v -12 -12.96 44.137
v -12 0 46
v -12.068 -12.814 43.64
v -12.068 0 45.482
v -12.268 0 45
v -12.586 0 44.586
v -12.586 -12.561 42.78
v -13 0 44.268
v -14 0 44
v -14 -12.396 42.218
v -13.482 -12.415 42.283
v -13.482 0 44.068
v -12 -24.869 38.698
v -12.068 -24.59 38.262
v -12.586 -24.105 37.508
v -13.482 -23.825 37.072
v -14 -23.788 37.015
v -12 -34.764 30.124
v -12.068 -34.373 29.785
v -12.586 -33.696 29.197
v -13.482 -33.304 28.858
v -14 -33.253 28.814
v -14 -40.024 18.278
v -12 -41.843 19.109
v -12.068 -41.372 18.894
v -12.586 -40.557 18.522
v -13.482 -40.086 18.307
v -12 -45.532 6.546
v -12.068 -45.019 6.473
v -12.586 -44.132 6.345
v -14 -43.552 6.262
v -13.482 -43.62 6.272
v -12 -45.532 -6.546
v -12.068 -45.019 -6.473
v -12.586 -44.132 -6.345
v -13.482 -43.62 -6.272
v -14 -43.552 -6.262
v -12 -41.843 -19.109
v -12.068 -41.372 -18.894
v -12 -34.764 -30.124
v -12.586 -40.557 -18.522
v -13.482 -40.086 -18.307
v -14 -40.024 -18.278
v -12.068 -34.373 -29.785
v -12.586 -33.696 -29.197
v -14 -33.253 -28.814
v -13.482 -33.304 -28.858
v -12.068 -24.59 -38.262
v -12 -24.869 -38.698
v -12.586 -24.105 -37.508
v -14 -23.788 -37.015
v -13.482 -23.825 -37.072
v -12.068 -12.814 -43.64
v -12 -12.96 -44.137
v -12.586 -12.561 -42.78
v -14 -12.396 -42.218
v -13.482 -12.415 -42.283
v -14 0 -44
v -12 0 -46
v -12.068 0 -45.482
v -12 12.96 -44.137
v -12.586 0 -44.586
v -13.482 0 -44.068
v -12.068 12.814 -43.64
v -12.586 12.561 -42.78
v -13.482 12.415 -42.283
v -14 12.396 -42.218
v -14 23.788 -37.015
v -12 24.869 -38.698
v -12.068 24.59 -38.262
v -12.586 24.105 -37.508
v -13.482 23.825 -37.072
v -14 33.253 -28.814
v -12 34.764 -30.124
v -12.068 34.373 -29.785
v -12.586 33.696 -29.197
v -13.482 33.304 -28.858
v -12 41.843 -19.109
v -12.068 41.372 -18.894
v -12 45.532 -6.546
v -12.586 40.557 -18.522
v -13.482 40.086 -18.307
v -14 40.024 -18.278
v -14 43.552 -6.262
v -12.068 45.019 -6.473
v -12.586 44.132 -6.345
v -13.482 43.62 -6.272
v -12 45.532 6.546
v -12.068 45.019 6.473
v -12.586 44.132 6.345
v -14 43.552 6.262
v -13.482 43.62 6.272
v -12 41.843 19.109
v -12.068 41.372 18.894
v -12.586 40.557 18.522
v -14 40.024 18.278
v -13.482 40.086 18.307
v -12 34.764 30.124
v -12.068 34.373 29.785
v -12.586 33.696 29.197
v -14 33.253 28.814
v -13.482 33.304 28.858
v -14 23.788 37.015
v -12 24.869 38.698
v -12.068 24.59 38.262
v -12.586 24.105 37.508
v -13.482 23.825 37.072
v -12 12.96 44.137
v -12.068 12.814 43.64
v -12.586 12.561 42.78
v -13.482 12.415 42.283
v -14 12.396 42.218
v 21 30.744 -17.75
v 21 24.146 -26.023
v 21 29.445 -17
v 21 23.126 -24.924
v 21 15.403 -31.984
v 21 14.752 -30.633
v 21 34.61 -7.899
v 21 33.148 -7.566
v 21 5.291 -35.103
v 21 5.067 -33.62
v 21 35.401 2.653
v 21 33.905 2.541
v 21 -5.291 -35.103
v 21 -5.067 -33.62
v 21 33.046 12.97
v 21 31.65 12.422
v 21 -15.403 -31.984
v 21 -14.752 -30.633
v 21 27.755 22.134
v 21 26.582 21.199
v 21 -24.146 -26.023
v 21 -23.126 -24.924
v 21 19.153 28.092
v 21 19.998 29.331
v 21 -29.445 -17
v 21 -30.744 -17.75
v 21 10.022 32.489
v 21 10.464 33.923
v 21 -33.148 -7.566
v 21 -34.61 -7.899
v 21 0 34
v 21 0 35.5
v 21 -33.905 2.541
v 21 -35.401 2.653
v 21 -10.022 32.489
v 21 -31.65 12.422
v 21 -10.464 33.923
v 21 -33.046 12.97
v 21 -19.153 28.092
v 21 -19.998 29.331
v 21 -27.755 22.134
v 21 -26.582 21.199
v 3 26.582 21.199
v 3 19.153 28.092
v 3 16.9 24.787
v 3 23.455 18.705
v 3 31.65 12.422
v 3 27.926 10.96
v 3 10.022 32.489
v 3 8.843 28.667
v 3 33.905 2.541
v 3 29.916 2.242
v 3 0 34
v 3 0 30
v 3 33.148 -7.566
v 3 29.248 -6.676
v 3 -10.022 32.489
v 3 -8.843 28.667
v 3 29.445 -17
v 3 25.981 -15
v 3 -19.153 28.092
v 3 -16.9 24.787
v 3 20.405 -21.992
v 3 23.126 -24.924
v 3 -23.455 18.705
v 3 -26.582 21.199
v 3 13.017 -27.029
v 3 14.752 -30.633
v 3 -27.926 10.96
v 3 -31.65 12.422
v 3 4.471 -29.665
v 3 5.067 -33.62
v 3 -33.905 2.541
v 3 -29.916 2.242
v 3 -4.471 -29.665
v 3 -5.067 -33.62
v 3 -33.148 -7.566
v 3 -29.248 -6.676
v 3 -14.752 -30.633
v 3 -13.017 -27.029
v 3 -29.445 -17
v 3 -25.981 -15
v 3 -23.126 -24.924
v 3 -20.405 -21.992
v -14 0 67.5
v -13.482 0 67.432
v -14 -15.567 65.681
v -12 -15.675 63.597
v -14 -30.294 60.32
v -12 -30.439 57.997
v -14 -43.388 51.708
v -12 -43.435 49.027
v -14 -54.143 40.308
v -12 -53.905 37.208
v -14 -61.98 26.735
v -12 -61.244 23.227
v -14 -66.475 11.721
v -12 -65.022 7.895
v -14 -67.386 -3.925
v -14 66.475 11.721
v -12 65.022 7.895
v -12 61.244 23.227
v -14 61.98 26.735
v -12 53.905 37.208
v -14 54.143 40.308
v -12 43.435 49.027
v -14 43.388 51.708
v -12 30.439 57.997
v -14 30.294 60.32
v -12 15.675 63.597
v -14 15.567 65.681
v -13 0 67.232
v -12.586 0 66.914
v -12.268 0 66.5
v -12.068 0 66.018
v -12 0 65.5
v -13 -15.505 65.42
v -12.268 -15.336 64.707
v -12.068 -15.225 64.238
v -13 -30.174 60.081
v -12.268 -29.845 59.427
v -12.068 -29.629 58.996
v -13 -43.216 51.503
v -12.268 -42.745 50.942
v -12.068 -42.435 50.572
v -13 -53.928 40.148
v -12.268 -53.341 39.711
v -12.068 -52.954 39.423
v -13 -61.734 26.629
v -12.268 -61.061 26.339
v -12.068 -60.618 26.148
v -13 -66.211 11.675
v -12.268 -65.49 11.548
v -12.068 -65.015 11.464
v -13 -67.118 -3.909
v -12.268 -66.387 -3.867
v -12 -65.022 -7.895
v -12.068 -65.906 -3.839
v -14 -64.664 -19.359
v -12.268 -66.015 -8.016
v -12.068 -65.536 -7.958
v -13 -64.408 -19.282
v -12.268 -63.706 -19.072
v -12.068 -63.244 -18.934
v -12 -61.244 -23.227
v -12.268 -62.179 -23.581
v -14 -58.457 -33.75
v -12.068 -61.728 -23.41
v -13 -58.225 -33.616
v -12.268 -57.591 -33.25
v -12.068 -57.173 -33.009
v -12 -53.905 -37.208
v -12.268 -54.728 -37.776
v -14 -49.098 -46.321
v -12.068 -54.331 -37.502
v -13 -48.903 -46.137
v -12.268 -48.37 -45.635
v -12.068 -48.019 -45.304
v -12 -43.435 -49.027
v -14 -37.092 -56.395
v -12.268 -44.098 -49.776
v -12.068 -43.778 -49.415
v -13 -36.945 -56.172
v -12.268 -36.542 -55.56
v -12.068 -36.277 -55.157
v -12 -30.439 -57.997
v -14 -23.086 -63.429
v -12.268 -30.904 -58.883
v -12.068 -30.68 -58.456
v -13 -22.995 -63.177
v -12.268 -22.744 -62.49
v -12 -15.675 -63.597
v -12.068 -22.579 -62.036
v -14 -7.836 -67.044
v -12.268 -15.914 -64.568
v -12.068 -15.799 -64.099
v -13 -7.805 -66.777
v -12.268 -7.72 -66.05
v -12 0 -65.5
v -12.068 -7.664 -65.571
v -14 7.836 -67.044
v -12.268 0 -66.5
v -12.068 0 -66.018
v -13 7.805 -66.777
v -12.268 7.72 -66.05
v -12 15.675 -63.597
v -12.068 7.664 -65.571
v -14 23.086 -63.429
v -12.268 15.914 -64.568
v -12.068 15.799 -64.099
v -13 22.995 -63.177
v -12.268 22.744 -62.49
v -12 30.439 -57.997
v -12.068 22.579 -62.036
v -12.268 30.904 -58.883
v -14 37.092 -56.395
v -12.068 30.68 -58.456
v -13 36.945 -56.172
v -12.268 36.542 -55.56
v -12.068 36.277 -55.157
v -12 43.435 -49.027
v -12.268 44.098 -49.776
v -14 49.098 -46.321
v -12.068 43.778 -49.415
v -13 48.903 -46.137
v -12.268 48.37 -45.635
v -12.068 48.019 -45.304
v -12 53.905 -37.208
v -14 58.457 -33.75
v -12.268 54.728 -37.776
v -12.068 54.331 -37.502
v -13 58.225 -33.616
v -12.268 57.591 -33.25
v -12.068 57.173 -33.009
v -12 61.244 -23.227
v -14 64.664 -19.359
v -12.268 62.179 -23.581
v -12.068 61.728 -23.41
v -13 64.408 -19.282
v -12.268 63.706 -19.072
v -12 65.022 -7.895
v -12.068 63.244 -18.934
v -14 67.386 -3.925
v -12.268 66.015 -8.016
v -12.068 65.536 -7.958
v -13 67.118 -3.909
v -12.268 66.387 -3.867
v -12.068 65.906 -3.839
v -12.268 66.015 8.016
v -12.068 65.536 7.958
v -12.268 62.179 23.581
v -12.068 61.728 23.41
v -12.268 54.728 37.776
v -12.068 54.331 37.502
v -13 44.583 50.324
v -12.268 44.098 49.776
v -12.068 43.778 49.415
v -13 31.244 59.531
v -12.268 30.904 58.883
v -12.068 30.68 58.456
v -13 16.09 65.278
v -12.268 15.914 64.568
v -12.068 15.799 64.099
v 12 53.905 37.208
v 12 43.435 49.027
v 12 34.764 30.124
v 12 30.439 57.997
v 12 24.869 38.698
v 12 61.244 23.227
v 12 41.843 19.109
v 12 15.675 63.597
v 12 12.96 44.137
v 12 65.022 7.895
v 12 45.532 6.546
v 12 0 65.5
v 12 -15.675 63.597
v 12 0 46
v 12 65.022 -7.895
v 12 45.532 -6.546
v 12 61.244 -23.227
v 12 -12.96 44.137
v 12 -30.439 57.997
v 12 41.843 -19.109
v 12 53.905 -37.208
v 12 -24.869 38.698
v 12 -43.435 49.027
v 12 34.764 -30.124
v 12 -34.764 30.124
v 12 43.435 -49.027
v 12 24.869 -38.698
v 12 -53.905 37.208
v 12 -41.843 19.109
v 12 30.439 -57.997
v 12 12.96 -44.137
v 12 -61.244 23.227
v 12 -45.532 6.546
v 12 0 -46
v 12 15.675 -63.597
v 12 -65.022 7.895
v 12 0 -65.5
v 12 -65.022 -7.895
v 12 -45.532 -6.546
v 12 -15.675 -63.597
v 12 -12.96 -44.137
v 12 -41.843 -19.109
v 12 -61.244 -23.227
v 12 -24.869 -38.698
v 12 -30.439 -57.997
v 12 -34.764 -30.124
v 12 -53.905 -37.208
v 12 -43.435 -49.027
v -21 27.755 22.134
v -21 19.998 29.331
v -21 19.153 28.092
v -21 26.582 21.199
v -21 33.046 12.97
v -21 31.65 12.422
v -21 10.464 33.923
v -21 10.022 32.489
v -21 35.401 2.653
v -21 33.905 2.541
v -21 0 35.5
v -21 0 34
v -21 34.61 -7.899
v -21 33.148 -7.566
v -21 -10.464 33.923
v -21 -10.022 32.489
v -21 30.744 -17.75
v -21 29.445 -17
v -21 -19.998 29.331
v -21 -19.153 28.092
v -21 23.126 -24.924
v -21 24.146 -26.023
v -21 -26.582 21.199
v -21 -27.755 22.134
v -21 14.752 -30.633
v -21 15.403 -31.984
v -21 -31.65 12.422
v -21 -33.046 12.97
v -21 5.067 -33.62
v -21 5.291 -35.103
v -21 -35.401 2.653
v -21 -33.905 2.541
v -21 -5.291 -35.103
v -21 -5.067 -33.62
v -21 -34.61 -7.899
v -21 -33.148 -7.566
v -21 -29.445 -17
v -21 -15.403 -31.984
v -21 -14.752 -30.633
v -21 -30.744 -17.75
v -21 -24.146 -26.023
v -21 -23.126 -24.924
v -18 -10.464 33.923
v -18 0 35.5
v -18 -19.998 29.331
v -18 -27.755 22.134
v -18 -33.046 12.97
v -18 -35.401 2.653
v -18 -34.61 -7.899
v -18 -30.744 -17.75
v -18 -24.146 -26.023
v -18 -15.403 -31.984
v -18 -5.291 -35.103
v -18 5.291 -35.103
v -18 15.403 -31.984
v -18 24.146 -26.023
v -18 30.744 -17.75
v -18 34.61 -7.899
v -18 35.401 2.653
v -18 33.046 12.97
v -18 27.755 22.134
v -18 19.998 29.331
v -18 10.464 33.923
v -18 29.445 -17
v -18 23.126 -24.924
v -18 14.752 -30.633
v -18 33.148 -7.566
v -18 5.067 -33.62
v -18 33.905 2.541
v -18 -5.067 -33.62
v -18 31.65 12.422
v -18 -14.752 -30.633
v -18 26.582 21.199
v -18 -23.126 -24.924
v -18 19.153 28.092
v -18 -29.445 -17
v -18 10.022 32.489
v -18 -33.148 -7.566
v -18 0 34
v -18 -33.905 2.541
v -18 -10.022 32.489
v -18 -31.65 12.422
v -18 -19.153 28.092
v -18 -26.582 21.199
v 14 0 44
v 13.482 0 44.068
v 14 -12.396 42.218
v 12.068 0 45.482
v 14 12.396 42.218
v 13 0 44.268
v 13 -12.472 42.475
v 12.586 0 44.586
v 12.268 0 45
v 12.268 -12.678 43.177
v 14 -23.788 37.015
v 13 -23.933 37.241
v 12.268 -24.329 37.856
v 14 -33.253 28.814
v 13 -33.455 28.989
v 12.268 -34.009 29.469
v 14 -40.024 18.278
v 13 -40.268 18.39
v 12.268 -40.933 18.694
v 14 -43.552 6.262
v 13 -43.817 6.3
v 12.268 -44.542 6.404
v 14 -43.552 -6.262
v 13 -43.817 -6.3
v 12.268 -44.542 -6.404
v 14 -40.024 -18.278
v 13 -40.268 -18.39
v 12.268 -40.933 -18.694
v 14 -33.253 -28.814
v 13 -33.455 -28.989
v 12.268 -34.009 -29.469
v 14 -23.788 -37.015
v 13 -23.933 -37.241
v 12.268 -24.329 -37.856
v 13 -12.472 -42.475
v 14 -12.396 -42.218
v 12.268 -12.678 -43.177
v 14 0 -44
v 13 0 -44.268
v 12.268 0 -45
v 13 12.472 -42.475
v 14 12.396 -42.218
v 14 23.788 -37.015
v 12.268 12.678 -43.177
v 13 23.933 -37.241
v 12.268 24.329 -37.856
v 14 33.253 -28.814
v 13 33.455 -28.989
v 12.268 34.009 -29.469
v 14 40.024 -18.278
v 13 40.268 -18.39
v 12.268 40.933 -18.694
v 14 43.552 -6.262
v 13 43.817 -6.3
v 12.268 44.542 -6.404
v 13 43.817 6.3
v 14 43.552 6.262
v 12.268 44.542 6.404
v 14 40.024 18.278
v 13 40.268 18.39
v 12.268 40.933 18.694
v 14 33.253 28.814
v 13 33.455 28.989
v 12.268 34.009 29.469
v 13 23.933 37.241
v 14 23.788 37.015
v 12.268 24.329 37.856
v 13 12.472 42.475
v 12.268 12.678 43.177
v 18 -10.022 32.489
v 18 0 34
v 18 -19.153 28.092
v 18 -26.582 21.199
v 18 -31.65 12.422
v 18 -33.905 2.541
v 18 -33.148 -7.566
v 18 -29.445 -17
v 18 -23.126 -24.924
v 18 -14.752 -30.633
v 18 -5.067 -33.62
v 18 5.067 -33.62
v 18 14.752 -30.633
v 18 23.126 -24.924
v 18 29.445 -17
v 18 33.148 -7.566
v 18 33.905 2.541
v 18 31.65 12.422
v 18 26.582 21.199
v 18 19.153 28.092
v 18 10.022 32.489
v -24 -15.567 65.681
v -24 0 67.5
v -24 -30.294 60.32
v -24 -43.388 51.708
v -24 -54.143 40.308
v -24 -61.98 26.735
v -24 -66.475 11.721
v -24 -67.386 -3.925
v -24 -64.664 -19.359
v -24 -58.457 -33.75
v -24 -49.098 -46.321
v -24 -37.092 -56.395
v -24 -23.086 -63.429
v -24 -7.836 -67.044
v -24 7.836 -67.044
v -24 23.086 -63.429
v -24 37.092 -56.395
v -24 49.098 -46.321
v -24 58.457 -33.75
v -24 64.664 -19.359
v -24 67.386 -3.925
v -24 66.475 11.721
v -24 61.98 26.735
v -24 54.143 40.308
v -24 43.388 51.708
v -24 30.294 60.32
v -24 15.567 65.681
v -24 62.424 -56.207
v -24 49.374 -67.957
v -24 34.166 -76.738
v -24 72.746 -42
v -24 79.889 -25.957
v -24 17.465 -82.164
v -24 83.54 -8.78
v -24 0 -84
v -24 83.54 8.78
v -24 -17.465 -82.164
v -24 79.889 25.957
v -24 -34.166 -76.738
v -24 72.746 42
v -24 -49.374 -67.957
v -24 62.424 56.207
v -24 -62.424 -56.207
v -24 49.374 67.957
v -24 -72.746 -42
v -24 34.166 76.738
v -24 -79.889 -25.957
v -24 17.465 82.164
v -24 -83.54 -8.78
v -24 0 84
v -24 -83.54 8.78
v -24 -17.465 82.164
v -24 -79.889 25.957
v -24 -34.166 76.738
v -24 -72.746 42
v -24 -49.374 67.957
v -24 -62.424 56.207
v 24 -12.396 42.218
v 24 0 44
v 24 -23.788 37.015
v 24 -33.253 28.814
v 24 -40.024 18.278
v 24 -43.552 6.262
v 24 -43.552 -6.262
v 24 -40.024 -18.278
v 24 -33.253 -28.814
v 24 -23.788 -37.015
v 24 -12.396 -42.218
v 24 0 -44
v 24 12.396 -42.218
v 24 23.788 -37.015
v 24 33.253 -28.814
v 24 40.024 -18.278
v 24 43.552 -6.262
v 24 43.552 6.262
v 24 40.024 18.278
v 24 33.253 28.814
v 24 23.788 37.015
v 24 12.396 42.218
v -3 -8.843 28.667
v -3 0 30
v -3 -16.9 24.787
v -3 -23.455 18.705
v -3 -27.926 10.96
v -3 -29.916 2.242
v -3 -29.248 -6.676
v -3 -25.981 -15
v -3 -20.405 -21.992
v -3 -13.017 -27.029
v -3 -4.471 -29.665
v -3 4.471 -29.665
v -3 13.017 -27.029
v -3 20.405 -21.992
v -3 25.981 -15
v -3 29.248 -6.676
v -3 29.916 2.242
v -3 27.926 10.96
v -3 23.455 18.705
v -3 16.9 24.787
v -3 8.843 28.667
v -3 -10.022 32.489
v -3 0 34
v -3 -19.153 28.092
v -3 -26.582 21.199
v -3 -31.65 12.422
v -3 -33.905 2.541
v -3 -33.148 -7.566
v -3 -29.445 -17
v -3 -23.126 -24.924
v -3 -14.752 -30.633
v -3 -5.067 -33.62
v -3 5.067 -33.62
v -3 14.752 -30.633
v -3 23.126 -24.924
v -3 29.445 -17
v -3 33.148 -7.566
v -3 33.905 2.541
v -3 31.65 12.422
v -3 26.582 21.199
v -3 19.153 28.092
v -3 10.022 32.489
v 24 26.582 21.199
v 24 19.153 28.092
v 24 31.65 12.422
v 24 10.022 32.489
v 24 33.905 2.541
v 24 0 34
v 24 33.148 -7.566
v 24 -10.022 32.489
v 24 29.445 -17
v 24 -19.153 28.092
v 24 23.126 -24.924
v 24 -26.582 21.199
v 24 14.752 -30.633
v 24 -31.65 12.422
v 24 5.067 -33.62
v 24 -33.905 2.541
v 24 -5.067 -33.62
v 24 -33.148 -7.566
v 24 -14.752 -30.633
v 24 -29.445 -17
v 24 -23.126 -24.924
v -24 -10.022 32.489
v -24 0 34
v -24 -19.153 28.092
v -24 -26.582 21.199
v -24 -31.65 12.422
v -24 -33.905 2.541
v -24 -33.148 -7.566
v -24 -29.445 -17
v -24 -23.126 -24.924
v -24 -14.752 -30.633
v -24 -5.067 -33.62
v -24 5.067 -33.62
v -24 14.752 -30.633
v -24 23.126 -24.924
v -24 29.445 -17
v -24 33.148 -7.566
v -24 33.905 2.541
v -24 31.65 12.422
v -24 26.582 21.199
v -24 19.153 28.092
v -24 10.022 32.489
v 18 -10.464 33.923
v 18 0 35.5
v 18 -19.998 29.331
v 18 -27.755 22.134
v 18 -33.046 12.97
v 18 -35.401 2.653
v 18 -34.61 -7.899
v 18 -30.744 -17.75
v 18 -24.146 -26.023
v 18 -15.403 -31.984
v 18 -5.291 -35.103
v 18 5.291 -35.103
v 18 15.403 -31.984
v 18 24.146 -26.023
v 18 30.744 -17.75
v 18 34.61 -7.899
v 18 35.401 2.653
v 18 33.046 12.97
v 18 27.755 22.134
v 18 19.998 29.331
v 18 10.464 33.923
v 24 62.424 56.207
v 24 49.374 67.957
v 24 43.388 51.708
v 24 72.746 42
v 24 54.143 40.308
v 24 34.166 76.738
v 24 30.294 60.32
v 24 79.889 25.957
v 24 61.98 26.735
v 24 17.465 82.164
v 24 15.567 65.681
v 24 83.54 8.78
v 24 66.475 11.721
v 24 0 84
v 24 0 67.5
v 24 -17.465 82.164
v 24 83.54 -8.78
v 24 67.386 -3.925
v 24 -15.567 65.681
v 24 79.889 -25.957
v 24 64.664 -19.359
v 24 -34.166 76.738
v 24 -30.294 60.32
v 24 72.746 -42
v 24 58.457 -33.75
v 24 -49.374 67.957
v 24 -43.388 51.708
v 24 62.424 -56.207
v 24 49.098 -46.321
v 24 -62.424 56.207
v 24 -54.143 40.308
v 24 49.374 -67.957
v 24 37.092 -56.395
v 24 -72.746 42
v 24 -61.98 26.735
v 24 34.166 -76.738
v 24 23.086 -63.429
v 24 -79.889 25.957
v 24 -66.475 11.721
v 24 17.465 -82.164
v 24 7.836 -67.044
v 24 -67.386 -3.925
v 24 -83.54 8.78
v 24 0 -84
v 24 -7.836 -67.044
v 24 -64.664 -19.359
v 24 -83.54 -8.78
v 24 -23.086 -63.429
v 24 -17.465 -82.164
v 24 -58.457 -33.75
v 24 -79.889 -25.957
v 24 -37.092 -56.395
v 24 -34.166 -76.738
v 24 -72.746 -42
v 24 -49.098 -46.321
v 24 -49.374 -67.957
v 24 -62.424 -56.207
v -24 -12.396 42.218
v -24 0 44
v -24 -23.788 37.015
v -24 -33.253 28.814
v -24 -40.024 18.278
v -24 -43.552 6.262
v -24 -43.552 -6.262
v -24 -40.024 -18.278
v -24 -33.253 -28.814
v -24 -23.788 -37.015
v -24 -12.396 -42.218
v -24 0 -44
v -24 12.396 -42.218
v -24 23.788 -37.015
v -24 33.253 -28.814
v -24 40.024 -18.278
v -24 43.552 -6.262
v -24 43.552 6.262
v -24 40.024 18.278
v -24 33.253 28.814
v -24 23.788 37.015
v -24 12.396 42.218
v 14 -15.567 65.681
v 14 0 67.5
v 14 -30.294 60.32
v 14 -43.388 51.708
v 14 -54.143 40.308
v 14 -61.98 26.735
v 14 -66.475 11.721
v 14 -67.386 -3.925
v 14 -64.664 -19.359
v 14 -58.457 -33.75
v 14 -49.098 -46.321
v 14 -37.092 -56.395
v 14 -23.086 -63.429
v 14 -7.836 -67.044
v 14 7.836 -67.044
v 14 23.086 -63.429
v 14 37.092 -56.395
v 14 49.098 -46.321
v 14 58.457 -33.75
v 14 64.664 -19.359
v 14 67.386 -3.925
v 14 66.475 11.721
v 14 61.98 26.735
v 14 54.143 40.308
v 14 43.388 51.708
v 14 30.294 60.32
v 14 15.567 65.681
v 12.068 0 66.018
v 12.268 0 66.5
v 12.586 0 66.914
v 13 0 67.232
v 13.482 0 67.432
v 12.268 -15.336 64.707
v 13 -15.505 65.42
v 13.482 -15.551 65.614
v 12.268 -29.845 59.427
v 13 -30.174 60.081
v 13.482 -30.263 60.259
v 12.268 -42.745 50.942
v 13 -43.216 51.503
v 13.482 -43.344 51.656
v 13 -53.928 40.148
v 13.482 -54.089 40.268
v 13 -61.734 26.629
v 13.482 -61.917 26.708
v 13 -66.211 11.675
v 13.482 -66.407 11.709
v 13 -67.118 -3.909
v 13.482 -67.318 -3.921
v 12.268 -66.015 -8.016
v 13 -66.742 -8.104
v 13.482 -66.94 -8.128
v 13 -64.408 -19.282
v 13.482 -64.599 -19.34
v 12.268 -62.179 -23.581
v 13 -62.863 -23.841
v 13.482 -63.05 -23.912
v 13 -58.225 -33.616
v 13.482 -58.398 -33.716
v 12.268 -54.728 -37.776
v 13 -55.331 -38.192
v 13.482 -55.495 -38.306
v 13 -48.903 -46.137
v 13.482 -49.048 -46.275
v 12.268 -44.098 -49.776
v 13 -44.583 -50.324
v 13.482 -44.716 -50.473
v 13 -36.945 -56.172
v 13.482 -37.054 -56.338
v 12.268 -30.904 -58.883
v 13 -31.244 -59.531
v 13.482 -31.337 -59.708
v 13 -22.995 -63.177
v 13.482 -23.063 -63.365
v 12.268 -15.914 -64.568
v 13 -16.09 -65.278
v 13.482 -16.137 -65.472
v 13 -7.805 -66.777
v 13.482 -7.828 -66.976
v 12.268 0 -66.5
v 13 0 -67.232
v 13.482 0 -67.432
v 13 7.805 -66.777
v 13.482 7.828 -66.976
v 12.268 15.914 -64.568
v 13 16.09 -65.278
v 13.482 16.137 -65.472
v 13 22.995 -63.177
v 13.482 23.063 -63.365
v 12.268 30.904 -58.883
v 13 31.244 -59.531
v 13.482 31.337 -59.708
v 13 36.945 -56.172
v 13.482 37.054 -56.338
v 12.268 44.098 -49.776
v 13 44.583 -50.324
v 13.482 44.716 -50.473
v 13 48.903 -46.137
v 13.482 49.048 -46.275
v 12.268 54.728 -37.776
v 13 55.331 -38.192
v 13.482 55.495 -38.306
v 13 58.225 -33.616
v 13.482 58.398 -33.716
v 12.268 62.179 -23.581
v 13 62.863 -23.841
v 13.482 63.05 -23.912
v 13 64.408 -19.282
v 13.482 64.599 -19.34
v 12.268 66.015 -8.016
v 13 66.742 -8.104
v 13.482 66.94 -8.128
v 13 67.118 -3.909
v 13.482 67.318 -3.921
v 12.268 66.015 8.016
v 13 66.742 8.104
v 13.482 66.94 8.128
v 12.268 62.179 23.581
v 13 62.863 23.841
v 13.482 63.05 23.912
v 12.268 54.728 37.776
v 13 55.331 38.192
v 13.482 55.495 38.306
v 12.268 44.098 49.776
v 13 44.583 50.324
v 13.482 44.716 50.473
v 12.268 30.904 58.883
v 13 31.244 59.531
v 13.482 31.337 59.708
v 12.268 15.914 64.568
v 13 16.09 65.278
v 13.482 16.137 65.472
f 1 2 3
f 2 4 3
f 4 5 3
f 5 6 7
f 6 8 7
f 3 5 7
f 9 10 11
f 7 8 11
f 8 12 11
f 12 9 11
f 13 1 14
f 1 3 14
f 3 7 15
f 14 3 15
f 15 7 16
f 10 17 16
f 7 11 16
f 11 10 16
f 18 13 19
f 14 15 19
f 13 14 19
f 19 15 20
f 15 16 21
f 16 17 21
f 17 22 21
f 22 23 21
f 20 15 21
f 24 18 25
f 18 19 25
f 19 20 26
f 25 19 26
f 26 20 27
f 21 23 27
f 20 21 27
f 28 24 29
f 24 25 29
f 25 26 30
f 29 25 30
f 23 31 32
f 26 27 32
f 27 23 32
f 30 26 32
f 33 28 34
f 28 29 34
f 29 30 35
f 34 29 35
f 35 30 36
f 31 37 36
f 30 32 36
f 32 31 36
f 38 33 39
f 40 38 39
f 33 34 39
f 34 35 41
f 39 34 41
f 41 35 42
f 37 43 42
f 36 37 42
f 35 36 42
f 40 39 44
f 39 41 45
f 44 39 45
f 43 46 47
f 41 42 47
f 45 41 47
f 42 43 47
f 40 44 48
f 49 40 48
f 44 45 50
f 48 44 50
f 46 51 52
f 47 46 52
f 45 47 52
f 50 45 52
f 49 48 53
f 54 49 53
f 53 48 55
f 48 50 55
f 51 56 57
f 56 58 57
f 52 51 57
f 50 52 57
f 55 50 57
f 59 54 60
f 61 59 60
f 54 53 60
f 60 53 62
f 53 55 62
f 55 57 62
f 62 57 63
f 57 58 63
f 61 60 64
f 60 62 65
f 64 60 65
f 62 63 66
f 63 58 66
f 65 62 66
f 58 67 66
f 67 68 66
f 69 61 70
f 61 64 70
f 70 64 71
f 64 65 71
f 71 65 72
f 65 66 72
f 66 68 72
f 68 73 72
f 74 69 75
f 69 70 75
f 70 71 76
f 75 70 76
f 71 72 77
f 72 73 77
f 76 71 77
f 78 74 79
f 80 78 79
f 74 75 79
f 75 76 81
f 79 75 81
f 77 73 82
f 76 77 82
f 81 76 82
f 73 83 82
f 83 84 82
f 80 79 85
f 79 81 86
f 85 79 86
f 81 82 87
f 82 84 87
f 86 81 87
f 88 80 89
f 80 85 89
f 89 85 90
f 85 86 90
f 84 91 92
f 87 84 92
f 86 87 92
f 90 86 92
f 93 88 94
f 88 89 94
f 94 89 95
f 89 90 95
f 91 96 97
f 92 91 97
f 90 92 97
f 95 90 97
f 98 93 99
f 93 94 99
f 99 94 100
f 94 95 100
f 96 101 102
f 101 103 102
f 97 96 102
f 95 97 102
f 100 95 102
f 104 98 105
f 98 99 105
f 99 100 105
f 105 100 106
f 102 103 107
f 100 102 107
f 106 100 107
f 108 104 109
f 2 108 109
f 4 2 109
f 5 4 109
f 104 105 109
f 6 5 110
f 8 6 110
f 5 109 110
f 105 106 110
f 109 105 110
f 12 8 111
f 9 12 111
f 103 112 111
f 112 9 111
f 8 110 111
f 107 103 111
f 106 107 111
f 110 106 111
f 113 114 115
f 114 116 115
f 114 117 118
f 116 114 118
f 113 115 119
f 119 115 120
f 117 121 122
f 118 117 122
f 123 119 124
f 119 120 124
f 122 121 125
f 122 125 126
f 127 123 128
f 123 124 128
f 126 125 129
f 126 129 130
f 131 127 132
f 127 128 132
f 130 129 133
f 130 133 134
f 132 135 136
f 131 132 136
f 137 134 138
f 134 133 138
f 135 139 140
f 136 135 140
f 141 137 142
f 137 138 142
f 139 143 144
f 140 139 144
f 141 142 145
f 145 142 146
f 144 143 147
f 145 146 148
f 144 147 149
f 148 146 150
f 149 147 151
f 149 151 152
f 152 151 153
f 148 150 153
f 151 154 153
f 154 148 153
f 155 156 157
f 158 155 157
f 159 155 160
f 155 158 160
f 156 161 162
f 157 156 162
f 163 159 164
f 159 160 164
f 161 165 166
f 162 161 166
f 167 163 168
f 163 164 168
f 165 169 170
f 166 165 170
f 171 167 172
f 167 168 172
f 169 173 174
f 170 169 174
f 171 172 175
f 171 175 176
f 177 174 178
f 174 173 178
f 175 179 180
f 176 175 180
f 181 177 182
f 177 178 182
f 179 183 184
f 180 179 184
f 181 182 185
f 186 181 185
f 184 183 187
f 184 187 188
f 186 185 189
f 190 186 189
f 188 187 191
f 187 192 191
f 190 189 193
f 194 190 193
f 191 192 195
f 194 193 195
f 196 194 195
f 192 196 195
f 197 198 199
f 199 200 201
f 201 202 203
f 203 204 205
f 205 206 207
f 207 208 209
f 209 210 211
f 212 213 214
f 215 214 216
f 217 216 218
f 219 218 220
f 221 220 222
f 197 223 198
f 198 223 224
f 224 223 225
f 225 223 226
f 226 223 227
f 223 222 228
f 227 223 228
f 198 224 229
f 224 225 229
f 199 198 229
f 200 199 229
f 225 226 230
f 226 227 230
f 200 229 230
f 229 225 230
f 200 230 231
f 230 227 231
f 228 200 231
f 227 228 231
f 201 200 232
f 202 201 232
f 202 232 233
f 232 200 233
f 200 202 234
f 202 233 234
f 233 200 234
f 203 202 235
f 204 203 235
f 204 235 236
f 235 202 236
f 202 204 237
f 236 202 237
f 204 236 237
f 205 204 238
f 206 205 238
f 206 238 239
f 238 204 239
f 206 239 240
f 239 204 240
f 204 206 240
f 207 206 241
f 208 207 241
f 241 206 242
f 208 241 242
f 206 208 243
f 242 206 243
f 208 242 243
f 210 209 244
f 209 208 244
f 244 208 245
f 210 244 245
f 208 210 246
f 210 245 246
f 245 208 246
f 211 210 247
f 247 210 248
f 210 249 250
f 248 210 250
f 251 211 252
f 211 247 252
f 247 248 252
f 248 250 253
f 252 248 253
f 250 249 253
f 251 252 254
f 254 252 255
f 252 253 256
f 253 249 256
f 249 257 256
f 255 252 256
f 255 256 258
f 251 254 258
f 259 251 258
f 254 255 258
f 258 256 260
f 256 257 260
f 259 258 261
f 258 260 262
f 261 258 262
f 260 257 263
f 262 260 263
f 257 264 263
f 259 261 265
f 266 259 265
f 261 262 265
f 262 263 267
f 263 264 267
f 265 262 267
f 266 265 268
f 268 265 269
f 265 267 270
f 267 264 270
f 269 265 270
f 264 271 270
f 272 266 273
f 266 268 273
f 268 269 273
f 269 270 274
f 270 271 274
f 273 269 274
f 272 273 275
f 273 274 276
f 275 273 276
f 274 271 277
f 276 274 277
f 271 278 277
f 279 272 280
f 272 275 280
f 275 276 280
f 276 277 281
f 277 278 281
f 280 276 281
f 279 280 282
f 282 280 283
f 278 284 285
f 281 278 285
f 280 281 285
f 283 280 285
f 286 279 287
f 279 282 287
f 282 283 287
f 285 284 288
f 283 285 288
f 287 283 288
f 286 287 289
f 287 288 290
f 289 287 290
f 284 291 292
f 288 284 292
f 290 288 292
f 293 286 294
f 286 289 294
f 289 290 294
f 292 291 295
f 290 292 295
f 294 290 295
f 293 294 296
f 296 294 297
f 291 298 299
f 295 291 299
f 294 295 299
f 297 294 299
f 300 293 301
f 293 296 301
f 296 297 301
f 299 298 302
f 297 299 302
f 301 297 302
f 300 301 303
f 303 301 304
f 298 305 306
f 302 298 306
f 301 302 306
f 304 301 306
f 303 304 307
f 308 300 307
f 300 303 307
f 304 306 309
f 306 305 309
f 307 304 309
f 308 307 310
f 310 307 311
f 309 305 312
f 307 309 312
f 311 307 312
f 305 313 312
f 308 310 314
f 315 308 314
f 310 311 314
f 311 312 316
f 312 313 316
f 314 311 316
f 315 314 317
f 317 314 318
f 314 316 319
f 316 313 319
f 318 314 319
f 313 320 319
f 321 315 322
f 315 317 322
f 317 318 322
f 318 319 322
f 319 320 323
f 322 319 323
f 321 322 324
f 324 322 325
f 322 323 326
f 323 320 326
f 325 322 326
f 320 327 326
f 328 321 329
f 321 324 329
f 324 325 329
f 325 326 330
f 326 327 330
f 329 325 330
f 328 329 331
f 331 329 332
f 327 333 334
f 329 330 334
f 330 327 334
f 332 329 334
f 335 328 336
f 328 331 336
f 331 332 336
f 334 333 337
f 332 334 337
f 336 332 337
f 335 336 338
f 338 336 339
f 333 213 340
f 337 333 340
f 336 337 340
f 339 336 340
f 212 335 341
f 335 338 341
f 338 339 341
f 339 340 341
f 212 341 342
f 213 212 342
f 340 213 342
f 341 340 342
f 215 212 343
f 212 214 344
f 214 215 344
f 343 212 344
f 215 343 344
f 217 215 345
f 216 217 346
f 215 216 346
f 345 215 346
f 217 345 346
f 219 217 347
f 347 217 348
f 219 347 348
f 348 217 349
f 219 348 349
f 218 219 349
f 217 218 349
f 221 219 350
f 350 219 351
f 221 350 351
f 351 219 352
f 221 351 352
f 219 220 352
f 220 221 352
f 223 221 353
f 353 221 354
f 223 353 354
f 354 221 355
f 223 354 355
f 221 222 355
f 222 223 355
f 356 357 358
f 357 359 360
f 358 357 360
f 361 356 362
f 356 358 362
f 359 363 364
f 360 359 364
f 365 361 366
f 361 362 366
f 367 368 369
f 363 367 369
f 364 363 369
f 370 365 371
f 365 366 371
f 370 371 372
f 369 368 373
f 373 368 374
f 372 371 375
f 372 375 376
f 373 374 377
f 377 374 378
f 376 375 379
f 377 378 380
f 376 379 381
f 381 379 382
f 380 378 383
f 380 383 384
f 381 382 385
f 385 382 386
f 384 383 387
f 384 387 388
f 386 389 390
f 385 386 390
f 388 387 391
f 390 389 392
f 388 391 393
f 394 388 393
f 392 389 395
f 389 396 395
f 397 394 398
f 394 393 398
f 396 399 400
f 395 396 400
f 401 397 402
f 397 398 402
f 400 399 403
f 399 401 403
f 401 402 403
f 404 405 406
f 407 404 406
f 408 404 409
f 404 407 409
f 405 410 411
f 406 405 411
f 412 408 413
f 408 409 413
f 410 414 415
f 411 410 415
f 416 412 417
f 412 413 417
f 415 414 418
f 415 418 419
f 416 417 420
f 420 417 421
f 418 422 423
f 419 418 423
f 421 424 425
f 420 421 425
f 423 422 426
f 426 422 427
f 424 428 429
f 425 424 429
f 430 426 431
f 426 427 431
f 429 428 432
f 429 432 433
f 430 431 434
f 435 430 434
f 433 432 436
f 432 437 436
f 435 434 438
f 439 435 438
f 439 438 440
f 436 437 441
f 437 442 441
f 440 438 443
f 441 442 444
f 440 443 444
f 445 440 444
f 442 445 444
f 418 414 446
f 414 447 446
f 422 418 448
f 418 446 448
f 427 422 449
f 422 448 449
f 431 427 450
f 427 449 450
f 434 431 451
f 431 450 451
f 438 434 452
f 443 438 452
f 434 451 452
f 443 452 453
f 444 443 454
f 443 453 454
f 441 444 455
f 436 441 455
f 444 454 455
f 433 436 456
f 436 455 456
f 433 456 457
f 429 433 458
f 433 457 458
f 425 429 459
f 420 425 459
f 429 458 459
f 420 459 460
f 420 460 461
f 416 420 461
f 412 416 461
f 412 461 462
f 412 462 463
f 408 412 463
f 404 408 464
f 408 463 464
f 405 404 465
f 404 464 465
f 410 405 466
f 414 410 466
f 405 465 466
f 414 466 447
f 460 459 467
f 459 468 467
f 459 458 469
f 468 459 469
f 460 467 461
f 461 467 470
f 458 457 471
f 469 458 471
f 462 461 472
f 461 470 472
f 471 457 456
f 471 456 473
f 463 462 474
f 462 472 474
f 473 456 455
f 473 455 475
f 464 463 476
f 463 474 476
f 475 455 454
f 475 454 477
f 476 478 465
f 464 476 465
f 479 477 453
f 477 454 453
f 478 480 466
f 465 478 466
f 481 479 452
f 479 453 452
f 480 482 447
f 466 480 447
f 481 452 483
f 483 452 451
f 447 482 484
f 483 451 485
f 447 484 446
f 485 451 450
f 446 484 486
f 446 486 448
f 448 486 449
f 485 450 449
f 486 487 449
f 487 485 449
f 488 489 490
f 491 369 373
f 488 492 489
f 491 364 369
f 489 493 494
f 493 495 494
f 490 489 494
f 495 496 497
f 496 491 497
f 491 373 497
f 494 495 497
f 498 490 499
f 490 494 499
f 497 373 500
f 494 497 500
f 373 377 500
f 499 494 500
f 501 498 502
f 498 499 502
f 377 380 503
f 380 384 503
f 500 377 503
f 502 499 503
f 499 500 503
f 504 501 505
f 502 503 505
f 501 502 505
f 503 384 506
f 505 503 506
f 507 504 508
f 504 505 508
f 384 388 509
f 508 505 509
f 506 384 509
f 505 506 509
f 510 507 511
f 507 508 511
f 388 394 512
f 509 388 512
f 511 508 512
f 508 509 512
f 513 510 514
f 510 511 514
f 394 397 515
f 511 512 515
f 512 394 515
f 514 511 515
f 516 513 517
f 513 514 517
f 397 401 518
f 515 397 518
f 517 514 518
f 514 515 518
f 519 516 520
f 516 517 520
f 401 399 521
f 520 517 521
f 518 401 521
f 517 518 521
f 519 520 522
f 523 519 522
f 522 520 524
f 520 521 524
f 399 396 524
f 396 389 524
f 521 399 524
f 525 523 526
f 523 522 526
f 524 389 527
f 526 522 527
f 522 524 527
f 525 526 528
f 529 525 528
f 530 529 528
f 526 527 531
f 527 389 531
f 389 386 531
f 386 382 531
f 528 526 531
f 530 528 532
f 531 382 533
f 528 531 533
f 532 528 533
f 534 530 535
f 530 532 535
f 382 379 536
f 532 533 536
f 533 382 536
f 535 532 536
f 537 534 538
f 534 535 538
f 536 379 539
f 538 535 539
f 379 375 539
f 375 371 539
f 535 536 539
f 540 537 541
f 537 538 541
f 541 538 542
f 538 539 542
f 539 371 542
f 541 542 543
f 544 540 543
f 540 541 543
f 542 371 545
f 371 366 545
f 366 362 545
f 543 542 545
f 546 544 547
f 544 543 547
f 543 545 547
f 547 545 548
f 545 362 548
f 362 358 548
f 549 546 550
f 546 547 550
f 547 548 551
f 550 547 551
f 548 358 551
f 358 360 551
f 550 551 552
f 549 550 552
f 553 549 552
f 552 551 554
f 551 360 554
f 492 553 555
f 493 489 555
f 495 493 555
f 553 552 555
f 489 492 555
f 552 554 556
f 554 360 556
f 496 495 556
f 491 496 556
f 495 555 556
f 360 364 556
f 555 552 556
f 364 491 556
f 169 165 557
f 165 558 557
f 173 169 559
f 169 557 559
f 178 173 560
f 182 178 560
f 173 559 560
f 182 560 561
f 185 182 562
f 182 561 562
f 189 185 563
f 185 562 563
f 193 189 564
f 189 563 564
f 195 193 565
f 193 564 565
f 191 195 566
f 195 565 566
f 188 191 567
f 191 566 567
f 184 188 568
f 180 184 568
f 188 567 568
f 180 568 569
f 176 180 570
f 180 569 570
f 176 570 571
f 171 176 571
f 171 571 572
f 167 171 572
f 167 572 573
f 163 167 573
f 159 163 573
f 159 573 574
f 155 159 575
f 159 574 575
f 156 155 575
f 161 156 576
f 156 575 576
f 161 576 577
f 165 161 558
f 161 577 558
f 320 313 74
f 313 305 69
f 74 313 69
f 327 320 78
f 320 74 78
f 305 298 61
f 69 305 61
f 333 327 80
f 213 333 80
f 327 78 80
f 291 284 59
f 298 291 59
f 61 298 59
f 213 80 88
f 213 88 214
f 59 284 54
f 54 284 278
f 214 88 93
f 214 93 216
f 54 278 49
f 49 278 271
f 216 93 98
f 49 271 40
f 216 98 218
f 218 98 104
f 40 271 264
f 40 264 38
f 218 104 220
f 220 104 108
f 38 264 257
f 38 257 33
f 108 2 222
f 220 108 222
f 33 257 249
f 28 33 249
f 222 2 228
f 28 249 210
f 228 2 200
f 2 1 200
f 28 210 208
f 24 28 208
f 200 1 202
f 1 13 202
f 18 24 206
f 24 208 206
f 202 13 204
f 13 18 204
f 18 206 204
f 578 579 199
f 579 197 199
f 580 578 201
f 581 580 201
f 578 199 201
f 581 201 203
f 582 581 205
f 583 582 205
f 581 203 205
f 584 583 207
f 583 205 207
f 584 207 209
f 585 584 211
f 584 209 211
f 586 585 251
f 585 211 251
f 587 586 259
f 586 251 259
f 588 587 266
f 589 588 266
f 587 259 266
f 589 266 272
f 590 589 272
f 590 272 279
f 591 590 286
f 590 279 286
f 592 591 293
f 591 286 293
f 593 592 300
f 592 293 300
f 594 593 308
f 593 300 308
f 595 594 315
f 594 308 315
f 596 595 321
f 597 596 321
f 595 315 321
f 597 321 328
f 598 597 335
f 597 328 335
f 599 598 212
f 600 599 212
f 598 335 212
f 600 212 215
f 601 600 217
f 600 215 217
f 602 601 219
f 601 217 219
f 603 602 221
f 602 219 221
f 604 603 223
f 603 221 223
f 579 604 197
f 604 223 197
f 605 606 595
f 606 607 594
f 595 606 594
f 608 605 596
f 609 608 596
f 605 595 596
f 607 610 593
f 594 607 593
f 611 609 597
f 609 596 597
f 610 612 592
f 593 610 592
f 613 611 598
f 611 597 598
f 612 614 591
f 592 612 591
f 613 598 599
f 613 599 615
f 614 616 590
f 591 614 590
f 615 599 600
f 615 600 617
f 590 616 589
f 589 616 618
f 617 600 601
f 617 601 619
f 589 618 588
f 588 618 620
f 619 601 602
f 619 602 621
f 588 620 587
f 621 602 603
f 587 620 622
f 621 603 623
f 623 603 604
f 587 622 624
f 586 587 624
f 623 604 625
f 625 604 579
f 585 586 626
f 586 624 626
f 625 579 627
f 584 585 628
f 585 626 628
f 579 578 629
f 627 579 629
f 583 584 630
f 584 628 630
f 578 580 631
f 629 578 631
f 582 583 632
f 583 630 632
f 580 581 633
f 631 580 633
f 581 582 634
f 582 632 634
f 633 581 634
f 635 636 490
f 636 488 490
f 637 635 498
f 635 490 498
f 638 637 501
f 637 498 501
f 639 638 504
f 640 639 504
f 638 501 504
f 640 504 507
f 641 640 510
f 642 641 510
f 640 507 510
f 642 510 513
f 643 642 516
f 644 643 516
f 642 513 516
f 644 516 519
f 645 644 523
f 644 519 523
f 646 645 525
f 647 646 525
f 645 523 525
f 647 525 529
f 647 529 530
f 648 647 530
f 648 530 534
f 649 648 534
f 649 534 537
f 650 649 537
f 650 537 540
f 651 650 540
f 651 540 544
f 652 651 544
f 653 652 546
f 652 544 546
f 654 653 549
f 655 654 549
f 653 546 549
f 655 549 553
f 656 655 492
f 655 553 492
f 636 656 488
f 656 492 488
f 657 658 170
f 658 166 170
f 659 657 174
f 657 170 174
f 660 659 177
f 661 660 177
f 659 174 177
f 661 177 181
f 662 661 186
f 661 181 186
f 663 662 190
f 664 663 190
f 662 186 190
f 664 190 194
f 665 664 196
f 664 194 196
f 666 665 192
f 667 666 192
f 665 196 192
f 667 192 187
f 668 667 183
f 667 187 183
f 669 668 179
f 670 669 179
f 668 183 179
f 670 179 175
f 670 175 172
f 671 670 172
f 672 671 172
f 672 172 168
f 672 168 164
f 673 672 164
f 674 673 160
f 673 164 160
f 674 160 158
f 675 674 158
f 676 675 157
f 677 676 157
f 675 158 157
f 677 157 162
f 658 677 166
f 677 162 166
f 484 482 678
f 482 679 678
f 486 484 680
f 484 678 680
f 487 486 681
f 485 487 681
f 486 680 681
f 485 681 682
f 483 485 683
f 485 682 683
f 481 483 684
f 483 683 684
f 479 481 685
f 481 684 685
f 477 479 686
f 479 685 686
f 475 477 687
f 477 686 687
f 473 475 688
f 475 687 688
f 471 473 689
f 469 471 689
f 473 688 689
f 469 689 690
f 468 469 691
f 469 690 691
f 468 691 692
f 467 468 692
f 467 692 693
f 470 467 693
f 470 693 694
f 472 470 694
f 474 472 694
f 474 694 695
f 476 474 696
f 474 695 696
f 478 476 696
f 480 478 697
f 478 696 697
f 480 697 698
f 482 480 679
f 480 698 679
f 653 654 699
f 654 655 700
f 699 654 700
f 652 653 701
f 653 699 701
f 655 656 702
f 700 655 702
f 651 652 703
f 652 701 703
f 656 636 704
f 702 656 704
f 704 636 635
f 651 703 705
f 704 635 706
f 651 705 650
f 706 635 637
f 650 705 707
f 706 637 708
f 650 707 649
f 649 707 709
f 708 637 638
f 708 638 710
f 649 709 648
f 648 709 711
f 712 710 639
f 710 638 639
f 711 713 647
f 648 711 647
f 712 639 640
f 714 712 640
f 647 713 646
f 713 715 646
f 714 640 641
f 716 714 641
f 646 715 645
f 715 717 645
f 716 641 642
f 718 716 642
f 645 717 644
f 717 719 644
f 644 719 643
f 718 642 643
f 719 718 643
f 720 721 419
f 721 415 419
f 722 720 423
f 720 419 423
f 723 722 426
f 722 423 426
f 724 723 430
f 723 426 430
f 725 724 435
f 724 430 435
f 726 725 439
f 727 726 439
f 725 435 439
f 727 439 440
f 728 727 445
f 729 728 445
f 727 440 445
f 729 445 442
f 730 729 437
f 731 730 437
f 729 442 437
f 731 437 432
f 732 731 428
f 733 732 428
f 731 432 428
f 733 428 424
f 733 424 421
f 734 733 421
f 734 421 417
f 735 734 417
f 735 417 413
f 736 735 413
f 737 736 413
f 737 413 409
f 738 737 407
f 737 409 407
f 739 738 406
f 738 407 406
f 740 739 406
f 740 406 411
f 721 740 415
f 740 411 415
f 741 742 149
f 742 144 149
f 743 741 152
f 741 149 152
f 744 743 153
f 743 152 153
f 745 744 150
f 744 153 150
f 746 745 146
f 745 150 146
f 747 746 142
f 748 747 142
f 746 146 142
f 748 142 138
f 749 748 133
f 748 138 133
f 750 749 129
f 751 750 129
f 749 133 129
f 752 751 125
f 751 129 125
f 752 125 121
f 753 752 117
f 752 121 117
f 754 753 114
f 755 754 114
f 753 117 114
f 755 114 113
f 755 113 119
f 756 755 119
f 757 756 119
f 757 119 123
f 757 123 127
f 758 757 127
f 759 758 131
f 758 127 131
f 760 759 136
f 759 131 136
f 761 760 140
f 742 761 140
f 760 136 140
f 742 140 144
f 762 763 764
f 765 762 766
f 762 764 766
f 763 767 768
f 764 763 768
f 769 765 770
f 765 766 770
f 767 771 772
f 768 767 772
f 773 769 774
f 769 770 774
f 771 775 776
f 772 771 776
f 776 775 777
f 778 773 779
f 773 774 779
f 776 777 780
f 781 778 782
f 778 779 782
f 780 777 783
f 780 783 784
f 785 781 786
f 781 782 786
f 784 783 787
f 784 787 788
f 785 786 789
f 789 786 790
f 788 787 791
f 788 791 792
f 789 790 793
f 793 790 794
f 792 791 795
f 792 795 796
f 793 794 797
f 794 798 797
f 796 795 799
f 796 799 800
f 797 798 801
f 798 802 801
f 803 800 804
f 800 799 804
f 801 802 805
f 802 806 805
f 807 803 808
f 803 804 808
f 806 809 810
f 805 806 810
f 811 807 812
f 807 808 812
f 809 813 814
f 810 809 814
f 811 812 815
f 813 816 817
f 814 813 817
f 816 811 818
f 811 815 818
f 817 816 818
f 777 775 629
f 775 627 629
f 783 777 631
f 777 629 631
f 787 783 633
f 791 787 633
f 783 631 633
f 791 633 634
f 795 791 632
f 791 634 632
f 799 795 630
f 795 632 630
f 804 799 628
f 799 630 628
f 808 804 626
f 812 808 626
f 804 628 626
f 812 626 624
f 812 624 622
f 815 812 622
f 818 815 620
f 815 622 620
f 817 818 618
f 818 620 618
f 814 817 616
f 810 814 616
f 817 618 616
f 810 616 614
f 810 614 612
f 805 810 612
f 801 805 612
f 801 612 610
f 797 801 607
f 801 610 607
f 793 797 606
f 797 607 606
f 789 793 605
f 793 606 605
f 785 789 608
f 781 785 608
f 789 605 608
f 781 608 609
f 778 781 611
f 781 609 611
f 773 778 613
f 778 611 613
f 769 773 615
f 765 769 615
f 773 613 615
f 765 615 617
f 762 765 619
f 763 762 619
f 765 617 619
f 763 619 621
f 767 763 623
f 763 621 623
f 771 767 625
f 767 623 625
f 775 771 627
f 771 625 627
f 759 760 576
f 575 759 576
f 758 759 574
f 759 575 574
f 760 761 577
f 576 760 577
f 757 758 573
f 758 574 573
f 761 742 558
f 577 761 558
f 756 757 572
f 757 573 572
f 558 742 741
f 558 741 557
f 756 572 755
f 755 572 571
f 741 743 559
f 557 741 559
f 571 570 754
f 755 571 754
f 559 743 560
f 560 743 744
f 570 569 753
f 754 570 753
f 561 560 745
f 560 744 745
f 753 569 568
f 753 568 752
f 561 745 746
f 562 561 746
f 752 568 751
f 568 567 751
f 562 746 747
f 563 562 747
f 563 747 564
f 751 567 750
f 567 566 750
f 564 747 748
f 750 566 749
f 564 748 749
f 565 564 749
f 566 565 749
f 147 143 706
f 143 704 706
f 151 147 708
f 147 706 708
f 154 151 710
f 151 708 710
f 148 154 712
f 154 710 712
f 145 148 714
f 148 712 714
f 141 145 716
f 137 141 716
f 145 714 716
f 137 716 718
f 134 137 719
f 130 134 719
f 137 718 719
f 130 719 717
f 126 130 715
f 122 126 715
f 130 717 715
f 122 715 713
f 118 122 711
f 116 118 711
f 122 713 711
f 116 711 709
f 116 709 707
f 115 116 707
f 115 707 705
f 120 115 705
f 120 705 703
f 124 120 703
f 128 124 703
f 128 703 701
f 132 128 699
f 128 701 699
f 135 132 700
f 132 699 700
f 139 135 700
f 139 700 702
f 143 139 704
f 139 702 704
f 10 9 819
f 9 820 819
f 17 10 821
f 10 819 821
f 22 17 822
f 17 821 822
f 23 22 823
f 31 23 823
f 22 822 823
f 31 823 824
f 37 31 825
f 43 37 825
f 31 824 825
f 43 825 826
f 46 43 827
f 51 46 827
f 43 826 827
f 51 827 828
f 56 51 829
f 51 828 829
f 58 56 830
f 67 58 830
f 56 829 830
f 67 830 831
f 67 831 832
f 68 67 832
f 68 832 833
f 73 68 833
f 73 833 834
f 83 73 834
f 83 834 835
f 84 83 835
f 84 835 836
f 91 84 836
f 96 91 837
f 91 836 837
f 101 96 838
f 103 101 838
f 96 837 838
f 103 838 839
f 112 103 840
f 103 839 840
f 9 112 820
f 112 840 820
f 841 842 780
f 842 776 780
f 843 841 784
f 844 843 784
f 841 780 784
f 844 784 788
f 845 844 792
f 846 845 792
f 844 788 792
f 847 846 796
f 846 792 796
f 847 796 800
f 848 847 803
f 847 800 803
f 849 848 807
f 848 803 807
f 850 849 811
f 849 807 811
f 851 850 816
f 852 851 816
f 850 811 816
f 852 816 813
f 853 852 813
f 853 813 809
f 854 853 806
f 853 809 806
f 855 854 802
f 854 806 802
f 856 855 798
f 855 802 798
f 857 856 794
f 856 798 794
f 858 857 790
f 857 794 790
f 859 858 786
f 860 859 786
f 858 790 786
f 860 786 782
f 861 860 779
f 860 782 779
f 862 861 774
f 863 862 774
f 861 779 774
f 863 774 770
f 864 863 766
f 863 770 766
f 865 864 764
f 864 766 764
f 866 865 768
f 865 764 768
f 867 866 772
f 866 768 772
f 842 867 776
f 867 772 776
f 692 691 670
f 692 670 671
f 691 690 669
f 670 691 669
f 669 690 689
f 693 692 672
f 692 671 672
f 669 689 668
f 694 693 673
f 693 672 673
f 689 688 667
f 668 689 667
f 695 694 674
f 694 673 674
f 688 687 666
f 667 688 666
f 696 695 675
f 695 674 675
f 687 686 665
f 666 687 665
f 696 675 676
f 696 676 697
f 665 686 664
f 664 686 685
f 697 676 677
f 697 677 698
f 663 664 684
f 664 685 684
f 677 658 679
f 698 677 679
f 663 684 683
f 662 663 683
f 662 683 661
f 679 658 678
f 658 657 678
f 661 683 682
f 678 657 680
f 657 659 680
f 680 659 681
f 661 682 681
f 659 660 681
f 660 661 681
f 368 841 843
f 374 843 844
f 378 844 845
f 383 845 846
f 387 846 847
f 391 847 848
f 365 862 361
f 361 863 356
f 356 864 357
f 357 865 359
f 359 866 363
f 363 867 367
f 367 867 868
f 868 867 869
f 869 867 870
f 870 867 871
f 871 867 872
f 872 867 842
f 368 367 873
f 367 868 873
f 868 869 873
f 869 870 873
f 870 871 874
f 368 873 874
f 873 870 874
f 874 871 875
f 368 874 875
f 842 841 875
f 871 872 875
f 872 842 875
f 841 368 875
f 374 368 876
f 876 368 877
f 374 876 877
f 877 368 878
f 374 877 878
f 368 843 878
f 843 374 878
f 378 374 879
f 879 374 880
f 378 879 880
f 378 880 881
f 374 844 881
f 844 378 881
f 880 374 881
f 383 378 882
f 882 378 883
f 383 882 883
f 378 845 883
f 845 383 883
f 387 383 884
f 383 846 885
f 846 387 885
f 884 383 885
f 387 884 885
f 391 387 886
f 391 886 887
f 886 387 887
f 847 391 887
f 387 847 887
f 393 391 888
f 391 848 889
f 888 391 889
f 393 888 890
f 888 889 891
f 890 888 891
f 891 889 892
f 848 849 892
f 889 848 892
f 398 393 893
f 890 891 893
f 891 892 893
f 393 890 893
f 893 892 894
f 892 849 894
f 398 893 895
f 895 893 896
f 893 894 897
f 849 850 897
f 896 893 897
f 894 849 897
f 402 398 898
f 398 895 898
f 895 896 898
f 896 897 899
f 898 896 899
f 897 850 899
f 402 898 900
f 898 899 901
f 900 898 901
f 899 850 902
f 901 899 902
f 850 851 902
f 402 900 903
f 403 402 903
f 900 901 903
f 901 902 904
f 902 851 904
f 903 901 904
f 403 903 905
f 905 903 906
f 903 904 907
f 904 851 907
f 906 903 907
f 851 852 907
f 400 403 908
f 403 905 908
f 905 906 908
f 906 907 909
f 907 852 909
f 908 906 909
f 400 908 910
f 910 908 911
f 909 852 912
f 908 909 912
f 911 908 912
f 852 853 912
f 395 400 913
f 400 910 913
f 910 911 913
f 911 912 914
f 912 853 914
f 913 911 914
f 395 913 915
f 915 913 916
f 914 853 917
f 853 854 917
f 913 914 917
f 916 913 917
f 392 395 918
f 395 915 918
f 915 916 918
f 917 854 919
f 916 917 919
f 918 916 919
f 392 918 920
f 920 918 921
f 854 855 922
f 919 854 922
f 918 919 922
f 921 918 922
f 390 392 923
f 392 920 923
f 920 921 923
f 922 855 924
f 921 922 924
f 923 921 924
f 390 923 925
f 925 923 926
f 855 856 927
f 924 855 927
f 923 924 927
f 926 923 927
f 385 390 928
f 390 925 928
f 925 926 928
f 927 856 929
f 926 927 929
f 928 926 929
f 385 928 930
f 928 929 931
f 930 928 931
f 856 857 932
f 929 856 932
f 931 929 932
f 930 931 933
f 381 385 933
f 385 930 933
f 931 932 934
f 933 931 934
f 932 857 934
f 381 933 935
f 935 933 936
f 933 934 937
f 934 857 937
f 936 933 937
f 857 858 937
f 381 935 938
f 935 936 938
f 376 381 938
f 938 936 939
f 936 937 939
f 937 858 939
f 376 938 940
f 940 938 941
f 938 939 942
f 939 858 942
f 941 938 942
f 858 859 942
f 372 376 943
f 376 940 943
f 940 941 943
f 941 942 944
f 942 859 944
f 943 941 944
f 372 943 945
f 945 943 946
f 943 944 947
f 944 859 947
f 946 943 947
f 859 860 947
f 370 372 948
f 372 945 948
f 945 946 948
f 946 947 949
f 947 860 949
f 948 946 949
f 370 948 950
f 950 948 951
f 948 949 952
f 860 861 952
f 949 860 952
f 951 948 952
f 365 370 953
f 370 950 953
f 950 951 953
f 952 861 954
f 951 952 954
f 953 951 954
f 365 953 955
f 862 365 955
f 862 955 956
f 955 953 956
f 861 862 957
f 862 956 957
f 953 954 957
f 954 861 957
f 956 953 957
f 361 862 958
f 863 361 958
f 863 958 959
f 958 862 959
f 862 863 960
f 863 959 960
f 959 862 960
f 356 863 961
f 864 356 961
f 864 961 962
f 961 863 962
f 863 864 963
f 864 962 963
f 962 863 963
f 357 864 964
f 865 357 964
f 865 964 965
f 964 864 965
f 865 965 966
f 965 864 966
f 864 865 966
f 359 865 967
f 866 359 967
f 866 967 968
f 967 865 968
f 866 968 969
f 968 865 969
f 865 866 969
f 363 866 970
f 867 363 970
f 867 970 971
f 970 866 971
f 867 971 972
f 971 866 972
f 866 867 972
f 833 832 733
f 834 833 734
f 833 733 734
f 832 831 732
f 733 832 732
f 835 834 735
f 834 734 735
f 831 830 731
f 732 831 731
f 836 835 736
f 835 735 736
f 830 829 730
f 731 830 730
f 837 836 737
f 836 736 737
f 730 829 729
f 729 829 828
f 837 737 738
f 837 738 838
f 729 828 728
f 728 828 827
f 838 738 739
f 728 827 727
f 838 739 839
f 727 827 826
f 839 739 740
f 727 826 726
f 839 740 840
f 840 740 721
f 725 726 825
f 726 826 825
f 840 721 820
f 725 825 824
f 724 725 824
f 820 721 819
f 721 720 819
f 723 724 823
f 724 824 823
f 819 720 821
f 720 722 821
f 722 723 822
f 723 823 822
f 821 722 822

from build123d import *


with BuildPart() as f1:
    # F0 (on Front) → F1 (revolve)
    with BuildSketch(Plane.XZ):
        with BuildLine():
            Line((24, 84), (0, 84))
            Line((0, 84), (-24, 84))
            Line((-24, 84), (-24, 67.5))
            Line((-24, 67.5), (-14, 67.5))
            ThreePointArc((-14, 67.5), (-12.585786, 66.914214), (-12, 65.5))
            Line((-12, 65.5), (-12, 46))
            ThreePointArc((-12, 46), (-12.585786, 44.585786), (-14, 44))
            Line((-14, 44), (-24, 44))
            Line((-24, 44), (-24, 34))
            Line((-24, 34), (-21, 34))
            Line((-21, 34), (-21, 35.5))
            Line((-21, 35.5), (-18, 35.5))
            Line((-18, 35.5), (-18, 34))
            Line((-18, 34), (-3, 34))
            Line((-3, 34), (-3, 30))
            Line((-3, 30), (0, 30))
            Line((0, 30), (3, 30))
            Line((3, 30), (3, 34))
            Line((3, 34), (18, 34))
            Line((18, 34), (18, 35.5))
            Line((18, 35.5), (21, 35.5))
            Line((21, 35.5), (21, 34))
            Line((21, 34), (24, 34))
            Line((24, 34), (24, 44))
            Line((24, 44), (14, 44))
            ThreePointArc((14, 44), (12.585786, 44.585786), (12, 46))
            Line((12, 46), (12, 65.5))
            ThreePointArc((12, 65.5), (12.585786, 66.914214), (14, 67.5))
            Line((14, 67.5), (24, 67.5))
            Line((24, 67.5), (24, 84))
        make_face()
    revolve(axis=Axis((-12, 0, 0), (1, 0, 0)))


solid = f1.part
